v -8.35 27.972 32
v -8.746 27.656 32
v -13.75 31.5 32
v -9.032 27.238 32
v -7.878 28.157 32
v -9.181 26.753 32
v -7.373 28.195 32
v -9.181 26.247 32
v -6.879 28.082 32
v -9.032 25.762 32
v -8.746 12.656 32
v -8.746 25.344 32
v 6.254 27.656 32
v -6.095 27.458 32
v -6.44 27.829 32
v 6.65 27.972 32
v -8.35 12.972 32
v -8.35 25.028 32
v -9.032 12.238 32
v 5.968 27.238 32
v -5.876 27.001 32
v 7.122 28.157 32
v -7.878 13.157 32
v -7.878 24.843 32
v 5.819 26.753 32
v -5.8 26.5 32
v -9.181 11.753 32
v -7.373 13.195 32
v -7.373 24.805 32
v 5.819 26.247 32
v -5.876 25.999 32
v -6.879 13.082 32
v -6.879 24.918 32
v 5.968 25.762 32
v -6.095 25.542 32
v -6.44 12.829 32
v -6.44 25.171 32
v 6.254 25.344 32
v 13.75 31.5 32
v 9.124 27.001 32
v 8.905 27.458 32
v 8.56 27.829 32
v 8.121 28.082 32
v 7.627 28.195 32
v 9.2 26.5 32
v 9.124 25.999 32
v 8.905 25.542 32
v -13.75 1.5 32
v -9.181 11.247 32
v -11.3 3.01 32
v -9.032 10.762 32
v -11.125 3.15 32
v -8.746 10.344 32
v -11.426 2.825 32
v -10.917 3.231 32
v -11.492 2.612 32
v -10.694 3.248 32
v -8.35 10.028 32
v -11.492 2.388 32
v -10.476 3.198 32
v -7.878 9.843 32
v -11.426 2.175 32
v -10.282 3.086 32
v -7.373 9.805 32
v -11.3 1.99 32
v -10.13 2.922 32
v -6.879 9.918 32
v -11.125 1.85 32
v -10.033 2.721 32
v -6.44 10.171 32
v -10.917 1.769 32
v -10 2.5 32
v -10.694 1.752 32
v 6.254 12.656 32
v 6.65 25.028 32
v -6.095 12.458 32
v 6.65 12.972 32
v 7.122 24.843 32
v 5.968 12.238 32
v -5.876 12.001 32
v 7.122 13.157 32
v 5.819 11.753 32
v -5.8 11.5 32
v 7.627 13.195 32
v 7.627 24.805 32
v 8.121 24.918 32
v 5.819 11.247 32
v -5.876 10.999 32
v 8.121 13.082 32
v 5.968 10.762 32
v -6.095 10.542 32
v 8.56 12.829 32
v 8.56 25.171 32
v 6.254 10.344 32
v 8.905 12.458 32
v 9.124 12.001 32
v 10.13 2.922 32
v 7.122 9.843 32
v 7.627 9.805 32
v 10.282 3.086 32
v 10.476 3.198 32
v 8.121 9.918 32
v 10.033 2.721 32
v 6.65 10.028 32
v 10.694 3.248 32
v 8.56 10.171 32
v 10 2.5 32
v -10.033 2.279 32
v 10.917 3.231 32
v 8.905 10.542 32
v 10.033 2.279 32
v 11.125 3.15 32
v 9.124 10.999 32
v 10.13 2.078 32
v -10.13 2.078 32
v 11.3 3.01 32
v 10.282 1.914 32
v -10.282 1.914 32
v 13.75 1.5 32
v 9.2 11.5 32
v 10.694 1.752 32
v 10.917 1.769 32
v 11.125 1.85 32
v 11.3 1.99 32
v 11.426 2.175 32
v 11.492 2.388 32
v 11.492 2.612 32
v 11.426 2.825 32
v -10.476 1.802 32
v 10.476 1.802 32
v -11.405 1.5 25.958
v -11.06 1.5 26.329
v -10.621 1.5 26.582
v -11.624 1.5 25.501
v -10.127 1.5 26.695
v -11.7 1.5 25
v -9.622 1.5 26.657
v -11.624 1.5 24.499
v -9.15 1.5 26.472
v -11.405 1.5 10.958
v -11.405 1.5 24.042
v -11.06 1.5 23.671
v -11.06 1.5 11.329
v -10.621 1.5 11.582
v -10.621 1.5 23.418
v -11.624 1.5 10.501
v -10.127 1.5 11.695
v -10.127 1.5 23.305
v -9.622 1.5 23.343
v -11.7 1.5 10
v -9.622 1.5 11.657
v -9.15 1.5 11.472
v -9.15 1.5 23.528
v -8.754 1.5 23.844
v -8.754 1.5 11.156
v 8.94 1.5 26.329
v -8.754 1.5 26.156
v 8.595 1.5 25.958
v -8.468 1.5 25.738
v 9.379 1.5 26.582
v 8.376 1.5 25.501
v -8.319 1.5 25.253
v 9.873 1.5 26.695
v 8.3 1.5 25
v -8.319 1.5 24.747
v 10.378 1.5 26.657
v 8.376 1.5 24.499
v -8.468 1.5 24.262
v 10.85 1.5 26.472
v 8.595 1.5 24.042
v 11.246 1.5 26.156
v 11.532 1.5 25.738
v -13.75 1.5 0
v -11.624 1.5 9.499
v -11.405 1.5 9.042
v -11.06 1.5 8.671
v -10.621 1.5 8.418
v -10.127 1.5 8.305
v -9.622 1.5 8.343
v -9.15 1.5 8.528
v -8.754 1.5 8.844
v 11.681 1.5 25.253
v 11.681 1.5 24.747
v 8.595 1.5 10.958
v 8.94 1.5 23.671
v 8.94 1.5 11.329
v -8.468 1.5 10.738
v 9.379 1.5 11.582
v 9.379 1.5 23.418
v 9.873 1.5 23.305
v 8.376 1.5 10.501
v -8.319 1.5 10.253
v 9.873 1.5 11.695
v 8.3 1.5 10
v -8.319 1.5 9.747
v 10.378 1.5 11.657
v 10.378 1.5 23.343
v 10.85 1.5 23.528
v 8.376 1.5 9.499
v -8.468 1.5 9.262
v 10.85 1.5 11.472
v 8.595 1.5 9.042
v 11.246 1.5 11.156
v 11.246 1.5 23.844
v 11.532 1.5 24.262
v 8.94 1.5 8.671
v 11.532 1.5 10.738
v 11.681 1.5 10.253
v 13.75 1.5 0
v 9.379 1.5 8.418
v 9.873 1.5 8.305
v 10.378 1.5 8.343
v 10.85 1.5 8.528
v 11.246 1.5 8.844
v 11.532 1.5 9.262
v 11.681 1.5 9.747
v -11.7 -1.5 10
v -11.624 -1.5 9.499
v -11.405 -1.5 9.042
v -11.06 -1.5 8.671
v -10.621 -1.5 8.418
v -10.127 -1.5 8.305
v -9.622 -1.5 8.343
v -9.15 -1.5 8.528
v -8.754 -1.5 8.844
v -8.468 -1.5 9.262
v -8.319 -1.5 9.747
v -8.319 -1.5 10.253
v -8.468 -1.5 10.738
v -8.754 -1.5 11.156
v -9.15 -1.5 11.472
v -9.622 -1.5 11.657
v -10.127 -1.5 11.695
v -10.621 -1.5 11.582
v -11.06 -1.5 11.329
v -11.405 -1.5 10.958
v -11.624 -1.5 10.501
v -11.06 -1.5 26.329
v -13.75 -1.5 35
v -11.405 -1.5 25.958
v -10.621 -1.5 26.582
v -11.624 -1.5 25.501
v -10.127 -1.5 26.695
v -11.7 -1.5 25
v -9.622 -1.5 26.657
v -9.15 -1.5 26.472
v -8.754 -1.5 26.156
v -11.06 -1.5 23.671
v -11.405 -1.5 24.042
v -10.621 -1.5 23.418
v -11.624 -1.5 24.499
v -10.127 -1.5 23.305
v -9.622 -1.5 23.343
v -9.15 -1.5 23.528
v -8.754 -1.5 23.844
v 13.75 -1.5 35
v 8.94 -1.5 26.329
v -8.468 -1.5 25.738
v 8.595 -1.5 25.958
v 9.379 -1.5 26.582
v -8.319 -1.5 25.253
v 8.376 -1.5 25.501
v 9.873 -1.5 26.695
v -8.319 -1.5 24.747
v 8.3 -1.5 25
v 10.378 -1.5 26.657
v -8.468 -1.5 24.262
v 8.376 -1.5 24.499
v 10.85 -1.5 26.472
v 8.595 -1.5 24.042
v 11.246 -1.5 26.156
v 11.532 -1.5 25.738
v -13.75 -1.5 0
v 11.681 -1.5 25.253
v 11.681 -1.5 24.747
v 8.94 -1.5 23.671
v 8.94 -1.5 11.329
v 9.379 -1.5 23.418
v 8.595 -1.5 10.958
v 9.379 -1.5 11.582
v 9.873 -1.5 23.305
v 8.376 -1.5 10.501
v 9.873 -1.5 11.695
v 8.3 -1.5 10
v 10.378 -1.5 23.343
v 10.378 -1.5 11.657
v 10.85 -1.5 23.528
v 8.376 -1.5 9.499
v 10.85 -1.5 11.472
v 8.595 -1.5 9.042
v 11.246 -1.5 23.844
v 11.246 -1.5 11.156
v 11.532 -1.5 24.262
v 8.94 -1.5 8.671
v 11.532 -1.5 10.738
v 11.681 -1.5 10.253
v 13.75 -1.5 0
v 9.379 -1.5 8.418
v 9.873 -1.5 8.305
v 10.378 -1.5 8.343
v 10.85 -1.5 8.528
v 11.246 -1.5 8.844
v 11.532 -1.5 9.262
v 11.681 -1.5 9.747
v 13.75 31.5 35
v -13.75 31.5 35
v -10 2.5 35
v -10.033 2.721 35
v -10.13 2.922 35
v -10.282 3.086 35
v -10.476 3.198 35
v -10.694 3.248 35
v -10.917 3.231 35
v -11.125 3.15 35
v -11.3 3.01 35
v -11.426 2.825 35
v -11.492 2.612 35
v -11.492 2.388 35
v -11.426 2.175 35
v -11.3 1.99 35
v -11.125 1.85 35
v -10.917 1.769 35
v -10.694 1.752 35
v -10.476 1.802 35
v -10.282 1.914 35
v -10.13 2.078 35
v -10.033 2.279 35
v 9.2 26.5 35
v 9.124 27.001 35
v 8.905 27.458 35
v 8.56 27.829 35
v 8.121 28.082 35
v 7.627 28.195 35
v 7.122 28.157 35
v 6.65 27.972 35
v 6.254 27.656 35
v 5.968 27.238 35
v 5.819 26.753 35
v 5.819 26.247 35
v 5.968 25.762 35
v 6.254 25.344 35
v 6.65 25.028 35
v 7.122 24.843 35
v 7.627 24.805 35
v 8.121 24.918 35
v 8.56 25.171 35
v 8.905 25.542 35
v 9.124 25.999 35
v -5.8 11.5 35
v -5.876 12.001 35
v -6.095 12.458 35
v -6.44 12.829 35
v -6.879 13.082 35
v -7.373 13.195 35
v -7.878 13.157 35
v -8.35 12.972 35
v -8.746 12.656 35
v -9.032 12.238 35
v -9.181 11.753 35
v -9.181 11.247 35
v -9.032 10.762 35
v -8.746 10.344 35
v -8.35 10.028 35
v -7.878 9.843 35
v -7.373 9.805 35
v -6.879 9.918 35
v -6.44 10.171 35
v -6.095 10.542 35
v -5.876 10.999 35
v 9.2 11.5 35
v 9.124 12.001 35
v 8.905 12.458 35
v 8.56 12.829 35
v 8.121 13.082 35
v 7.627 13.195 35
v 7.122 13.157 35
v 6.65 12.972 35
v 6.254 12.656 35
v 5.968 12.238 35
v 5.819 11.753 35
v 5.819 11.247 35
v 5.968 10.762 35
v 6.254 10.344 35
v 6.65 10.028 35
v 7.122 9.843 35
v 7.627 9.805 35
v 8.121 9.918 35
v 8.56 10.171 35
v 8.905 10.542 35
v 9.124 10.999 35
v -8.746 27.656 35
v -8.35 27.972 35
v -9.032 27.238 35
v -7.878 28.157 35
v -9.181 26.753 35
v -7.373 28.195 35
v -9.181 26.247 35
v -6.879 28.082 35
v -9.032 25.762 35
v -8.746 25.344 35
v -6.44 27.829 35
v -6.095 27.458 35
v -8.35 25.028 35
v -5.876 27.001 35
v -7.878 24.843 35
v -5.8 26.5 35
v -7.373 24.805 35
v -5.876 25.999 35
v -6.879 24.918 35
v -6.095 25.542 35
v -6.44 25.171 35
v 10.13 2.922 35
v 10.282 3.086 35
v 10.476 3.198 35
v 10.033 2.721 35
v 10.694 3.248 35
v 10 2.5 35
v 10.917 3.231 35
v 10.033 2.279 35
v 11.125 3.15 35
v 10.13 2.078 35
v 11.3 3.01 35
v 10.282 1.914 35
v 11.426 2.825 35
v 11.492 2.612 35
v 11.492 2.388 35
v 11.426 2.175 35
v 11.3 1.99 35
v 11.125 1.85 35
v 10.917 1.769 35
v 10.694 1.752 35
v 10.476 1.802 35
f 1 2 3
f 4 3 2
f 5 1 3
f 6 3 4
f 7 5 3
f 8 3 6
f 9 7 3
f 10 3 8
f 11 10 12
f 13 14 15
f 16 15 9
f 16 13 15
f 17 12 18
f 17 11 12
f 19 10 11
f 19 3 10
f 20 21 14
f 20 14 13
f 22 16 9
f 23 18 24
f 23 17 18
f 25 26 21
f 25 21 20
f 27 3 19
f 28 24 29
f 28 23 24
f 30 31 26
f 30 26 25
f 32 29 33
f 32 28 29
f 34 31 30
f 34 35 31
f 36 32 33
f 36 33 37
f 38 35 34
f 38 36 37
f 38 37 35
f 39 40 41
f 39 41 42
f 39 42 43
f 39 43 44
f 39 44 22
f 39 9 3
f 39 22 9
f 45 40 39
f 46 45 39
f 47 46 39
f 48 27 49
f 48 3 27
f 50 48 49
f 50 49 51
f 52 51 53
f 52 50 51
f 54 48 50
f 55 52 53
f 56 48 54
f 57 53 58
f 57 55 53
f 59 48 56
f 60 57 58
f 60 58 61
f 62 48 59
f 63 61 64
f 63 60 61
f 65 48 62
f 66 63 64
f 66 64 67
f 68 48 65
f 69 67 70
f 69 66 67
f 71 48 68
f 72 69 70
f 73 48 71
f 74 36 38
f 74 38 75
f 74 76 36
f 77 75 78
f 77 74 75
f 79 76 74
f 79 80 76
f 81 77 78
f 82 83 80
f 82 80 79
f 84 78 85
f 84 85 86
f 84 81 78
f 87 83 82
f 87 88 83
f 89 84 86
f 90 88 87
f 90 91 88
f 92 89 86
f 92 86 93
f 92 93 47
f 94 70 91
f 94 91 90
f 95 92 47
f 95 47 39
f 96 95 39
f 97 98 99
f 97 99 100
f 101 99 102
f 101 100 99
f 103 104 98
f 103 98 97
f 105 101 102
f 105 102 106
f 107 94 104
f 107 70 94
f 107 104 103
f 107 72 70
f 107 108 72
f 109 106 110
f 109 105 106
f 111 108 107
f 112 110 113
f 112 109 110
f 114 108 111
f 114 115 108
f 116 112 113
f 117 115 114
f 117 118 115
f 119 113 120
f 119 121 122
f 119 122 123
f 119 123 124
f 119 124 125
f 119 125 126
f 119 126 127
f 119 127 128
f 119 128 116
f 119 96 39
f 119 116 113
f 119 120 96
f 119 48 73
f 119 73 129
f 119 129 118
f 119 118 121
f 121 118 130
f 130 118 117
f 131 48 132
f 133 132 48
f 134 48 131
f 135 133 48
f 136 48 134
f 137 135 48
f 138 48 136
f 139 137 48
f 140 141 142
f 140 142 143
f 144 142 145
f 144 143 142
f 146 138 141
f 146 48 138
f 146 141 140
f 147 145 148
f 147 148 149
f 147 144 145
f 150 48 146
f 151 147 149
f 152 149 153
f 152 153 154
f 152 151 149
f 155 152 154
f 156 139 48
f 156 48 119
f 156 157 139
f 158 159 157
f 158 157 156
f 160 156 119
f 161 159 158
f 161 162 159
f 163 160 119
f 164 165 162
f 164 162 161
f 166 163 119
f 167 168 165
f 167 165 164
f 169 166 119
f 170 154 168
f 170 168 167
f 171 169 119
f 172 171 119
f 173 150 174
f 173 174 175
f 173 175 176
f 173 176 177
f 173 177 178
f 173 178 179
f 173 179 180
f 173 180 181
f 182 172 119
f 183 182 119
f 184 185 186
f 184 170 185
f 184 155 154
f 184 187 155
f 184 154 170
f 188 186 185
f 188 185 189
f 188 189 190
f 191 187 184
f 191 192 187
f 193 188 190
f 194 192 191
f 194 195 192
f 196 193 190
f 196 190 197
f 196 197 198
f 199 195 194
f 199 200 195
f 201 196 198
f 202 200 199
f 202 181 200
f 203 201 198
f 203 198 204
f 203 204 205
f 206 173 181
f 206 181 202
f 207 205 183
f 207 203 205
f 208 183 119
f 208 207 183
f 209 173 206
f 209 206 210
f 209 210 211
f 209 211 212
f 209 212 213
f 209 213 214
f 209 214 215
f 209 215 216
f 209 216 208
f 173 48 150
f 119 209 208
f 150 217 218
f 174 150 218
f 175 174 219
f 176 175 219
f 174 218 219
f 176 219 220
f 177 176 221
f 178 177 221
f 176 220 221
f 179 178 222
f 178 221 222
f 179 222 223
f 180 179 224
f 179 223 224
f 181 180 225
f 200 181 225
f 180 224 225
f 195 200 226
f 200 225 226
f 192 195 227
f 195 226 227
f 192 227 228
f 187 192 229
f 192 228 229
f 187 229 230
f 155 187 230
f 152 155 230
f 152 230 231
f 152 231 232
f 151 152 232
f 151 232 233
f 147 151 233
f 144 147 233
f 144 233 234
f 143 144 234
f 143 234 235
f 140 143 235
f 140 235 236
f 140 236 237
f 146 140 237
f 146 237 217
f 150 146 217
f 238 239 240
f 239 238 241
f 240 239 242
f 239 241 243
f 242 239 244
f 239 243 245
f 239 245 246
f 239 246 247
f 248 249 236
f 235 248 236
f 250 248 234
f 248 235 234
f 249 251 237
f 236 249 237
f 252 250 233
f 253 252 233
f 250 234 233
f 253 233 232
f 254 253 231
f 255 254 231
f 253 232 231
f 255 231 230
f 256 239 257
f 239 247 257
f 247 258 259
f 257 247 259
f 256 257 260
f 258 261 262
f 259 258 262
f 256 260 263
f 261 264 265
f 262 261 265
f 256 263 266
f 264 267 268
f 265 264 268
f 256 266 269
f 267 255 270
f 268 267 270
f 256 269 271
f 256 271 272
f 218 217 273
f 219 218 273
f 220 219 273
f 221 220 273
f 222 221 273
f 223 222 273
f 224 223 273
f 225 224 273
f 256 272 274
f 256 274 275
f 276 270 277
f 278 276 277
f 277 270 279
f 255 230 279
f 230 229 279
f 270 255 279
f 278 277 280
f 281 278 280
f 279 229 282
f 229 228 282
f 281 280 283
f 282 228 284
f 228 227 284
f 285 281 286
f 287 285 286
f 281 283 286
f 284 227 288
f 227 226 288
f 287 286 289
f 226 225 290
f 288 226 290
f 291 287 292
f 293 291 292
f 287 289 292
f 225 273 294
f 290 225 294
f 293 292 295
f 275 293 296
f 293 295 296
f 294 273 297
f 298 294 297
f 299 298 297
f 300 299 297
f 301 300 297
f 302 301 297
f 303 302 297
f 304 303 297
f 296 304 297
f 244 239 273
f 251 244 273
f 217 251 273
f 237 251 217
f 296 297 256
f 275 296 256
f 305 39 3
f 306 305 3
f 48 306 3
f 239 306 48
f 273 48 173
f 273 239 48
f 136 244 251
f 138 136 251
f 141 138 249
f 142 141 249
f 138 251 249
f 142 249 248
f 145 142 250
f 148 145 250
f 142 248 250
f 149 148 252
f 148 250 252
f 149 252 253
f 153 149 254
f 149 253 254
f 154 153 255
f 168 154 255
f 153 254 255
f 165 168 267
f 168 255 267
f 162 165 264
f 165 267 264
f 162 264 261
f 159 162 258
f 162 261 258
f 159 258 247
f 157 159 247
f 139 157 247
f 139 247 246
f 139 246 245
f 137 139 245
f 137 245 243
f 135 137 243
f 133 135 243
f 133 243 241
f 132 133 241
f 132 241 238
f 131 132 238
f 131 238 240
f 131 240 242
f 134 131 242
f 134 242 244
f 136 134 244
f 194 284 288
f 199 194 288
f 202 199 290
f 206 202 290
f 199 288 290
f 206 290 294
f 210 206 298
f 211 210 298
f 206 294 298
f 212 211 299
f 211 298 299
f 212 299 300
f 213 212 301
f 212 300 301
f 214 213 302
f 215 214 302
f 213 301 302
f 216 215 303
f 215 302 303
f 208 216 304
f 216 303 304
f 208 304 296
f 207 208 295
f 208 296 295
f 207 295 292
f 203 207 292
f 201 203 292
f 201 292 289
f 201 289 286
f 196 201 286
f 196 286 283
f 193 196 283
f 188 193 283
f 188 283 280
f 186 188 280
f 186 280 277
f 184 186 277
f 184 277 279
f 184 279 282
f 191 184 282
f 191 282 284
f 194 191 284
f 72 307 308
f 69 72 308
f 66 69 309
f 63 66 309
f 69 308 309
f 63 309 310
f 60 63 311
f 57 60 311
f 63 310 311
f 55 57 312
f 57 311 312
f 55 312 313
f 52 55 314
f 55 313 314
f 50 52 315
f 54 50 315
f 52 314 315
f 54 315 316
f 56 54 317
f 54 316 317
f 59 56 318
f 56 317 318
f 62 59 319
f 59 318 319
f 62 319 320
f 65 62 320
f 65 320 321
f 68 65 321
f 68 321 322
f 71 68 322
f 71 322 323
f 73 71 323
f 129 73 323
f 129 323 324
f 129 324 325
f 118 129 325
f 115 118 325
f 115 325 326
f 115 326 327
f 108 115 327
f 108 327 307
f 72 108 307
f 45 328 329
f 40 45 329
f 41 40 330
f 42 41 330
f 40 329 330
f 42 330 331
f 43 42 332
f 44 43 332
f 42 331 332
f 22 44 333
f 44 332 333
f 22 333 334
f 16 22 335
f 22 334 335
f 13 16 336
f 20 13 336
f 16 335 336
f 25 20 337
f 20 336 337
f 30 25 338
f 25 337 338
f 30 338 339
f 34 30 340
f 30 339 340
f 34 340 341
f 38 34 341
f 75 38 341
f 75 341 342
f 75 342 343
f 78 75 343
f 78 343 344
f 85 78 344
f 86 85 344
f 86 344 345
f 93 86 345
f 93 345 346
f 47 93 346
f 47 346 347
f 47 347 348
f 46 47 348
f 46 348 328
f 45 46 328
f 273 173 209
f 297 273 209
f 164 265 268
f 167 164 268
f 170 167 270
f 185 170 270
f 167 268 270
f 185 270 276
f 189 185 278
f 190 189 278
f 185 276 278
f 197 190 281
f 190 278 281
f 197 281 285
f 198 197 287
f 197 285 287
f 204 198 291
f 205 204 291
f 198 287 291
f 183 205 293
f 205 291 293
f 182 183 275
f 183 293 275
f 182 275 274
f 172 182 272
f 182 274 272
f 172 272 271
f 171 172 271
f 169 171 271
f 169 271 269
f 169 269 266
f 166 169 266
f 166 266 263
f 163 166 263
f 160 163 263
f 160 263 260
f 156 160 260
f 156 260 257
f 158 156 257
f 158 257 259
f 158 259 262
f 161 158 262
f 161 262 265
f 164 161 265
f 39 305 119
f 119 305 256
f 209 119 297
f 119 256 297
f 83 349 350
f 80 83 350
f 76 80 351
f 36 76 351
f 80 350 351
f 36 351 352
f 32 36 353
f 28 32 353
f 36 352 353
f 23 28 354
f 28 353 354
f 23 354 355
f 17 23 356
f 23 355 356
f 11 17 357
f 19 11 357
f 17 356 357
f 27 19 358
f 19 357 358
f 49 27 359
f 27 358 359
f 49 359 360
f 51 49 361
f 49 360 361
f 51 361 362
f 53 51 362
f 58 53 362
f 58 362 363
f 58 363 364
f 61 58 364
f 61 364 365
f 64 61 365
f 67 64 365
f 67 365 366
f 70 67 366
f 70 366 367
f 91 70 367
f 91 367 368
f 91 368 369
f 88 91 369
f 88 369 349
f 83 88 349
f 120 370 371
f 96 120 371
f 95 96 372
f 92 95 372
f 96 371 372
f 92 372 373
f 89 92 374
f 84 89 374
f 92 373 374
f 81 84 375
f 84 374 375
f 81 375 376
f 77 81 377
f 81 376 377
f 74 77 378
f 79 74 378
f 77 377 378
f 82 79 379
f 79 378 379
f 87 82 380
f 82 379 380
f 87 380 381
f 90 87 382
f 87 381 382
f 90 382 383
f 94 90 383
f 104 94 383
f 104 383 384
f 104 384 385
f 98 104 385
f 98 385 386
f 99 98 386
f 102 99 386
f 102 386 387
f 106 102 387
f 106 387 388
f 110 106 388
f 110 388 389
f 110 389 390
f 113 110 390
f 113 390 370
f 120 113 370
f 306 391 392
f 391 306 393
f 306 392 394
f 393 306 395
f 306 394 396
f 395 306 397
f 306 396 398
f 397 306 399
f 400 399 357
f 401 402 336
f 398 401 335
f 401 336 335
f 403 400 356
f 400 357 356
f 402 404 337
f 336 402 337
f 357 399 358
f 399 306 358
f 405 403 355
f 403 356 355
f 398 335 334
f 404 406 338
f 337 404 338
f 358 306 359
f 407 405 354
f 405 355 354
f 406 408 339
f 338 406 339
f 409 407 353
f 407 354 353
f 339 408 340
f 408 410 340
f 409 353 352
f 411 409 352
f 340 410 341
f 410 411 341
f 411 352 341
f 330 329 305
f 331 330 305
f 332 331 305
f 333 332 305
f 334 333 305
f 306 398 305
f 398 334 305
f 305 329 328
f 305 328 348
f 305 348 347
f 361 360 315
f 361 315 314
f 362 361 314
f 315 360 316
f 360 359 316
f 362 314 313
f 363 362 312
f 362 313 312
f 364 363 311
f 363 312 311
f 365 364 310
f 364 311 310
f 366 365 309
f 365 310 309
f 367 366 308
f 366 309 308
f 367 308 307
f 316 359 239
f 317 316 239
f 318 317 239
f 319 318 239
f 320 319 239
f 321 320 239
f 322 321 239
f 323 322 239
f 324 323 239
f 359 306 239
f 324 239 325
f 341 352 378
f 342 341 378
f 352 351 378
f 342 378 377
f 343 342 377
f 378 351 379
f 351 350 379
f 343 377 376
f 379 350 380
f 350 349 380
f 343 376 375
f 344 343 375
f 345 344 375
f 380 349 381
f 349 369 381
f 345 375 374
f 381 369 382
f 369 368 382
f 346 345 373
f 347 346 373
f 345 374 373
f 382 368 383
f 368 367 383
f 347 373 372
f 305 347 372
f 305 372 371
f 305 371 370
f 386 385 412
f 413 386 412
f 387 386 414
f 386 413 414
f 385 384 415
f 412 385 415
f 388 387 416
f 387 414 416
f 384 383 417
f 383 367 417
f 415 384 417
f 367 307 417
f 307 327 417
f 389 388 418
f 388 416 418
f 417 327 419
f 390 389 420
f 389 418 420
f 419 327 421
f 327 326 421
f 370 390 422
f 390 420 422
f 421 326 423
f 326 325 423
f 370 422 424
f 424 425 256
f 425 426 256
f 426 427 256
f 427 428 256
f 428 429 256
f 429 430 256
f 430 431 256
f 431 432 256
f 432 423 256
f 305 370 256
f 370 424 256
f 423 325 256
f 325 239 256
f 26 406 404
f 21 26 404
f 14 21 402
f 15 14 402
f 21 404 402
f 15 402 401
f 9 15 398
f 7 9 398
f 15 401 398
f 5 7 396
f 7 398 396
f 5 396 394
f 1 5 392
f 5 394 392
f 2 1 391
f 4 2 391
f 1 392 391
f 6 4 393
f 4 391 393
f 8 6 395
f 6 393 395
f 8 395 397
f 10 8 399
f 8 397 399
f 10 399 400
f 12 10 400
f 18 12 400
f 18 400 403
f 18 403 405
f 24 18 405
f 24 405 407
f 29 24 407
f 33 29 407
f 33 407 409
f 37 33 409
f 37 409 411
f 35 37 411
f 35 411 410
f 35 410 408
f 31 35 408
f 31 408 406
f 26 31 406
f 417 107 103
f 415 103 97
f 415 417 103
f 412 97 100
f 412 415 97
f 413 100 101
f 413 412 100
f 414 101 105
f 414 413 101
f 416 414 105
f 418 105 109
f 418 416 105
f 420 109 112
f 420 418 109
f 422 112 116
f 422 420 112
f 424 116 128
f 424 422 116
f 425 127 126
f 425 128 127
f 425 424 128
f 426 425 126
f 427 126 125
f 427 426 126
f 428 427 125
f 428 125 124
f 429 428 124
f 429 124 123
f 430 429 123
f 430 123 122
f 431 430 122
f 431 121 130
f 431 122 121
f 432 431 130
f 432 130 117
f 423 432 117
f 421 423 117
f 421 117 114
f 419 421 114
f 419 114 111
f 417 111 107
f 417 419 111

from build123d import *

# Parameters (mm, degrees)
SKETCH1_W                = 27.5
SKETCH1_H                = 3
BOSS_EXTRUDE1_DEPTH      = 35
SKETCH2_W                = 27.5
SKETCH2_H                = 3
BOSS_EXTRUDE2_DEPTH      = 40
M3_CLEARANCE_HOLE1_D     = 3.4
M3_CLEARANCE_HOLE1_DEPTH = 5
M3_CLEARANCE_HOLE1_TIP   = 1.021463052
SKETCH6_R                = 0.75
CUT_EXTRUDE1_DEPTH       = 10
M3_CLEARANCE_HOLE2_D     = 3.4
M3_CLEARANCE_HOLE2_DEPTH = 5
M3_CLEARANCE_HOLE2_TIP   = 1.021463052
SKETCH12_W               = 27.5
SKETCH12_H               = 10
CUT_EXTRUDE2_DEPTH       = 4


with BuildPart() as part:
    # Sketch1 → Boss-Extrude1 (new body)
    with BuildSketch(Plane.XY):
        Rectangle(SKETCH1_W, SKETCH1_H)
    extrude(amount=BOSS_EXTRUDE1_DEPTH)

    # Sketch2 → Boss-Extrude2 (add)
    with BuildSketch(Plane(origin=(0, 1.5, 0), x_dir=(1, 0, 0), z_dir=(0, 1, 0))):
        with Locations((0, -33.5)):
            Rectangle(SKETCH2_W, SKETCH2_H)
    extrude(amount=BOSS_EXTRUDE2_DEPTH)

    # M3 Clearance Hole1
    with Locations(Plane(origin=(0, 1.5, 0), x_dir=(1, 0, 0), z_dir=(0, 1, 0))):
        with Locations((-10, -10), (-10, -25), (10, -25), (10, -10)):
            Hole(M3_CLEARANCE_HOLE1_D / 2, depth=M3_CLEARANCE_HOLE1_DEPTH)
            with Locations((0, 0, -(M3_CLEARANCE_HOLE1_DEPTH + M3_CLEARANCE_HOLE1_TIP / 2))):  # 118° drill point
                Cone(0, M3_CLEARANCE_HOLE1_D / 2, M3_CLEARANCE_HOLE1_TIP, mode=Mode.SUBTRACT)

    # Sketch6 → Cut-Extrude1 (cut)
    with BuildSketch(Plane.XY.offset(35)):
        with Locations((-10.75, 2.5)):
            Circle(SKETCH6_R)
    cut_extrude1 = extrude(amount=-CUT_EXTRUDE1_DEPTH, mode=Mode.SUBTRACT)

    # M3 Clearance Hole2
    with Locations(Plane(origin=(0, 0, 32), x_dir=(-1, 0, 0), z_dir=(0, 0, -1))):
        with Locations((-7.5, 11.5), (7.5, 11.5), (7.5, 26.5), (-7.5, 26.5)):
            Hole(M3_CLEARANCE_HOLE2_D / 2, depth=M3_CLEARANCE_HOLE2_DEPTH)
            with Locations((0, 0, -(M3_CLEARANCE_HOLE2_DEPTH + M3_CLEARANCE_HOLE2_TIP / 2))):  # 118° drill point
                Cone(0, M3_CLEARANCE_HOLE2_D / 2, M3_CLEARANCE_HOLE2_TIP, mode=Mode.SUBTRACT)

    # Mirror1: Cut-Extrude1 across plane
    add(cut_extrude1.mirror(Plane(origin=(0, 0, 0), x_dir=(0, 0, 1), z_dir=(1, 0, 0))), mode=Mode.SUBTRACT)

    # Sketch12 → Cut-Extrude2 (cut, through all)
    with BuildSketch(Plane(origin=(0, 0, 32), x_dir=(-1, 0, 0), z_dir=(0, 0, -1))):
        with Locations((0, 36.5)):
            Rectangle(SKETCH12_W, SKETCH12_H)
    extrude(amount=-CUT_EXTRUDE2_DEPTH, mode=Mode.SUBTRACT)


solid = part.part
